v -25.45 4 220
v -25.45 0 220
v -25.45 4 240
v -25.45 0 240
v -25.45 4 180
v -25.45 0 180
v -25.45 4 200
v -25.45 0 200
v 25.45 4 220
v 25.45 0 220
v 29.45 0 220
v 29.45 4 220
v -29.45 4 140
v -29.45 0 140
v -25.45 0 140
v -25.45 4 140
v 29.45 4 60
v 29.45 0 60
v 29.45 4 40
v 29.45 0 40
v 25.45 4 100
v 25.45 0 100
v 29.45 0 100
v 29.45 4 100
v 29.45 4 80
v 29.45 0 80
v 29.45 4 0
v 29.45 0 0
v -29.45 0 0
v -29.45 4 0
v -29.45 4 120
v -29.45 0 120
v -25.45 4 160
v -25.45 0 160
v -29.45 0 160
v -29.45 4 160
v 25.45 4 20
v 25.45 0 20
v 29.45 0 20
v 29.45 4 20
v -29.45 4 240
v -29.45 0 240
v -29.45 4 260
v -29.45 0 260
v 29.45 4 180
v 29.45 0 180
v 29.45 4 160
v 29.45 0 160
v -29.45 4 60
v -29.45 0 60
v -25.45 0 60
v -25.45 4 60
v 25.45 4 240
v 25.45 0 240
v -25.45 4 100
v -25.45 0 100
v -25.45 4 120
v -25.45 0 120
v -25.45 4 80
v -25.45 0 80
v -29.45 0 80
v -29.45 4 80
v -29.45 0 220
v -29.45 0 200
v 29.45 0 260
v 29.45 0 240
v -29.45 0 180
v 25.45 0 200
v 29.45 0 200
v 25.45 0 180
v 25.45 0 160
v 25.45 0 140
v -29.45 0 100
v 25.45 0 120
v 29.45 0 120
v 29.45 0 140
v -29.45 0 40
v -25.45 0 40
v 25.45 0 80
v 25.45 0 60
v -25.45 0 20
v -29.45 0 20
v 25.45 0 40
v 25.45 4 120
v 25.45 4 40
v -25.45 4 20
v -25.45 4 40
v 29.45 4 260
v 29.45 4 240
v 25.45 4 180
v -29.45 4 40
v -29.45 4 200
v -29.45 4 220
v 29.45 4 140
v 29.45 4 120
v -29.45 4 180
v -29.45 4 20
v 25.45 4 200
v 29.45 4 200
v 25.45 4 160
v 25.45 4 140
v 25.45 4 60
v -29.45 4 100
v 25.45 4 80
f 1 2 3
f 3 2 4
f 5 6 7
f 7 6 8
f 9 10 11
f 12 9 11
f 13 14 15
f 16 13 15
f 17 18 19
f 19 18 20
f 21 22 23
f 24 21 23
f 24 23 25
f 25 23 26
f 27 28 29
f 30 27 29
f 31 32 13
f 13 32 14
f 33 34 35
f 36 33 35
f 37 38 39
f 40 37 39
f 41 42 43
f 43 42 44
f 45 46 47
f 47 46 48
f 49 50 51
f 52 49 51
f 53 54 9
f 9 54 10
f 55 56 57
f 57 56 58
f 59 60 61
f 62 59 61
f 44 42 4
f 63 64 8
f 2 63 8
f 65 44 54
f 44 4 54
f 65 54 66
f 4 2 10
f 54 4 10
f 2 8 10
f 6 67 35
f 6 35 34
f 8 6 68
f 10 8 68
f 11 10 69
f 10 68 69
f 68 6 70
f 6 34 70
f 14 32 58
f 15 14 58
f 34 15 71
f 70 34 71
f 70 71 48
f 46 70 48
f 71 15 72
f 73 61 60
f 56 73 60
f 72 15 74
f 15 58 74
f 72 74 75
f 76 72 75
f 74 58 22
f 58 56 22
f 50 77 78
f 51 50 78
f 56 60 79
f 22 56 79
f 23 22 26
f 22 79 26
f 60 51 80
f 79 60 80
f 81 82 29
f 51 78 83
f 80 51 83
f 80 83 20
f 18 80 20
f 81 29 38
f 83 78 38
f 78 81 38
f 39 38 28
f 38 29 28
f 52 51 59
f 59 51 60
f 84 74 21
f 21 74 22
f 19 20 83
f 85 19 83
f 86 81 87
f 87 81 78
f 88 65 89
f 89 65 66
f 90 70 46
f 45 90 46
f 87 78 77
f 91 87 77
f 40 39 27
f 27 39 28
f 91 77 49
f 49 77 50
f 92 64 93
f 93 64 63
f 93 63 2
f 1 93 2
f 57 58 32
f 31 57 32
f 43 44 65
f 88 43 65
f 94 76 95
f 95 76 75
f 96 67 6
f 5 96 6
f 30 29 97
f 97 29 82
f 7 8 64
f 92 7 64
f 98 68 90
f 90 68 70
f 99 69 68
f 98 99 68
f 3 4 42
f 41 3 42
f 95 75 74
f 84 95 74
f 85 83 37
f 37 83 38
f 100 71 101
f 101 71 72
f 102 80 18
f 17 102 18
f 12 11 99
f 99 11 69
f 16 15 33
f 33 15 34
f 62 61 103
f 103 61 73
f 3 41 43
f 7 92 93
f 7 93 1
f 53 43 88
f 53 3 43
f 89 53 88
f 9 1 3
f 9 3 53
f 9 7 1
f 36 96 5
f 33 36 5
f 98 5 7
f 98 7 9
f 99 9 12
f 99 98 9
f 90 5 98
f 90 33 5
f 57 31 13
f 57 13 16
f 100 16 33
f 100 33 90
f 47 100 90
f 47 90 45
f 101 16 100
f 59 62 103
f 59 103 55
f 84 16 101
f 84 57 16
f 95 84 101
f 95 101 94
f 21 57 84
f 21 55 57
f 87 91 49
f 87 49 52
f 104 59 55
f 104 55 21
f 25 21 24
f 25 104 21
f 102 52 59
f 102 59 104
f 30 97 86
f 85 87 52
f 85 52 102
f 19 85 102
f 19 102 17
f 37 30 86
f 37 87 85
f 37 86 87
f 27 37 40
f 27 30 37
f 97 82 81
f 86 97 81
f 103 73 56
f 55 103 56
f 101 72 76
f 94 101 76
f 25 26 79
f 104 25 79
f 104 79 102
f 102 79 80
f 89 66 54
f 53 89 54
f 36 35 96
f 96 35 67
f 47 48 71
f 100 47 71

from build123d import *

# Parameters (mm, degrees)
EXTRUDE_1_DEPTH = 4


with BuildPart() as part:
    # Эскиз1 → Бобышка-Вытянуть1 (new body)
    with BuildSketch(Plane(origin=(0, 0, 0), x_dir=(1, 0, 0), z_dir=(0, 1, 0))):
        Polygon((-29.45, -40), (-29.45, -60), (-25.45, -60), (-25.45, -80), (-29.45, -80), (-29.45, -100), (-25.45, -100), (-25.45, -120), (-29.45, -120), (-29.45, -140), (-25.45, -140), (-25.45, -160), (-29.45, -160), (-29.45, -180), (-25.45, -180), (-25.45, -200), (-29.45, -200), (-29.45, -220), (-25.45, -220), (-25.45, -240), (-29.45, -240), (-29.45, -260), (29.45, -260), (29.45, -240), (25.45, -240), (25.45, -220), (29.45, -220), (29.45, -200), (25.45, -200), (25.45, -180), (29.45, -180), (29.45, -160), (25.45, -160), (25.45, -140), (29.45, -140), (29.45, -120), (25.45, -120), (25.45, -100), (29.45, -100), (29.45, -80), (25.45, -80), (25.45, -60), (29.45, -60), (29.45, -40), (25.45, -40), (25.45, -20), (29.45, -20), (29.45, 0), (-29.45, 0), (-29.45, -20), (-25.45, -20), (-25.45, -40), align=None)
    extrude(amount=EXTRUDE_1_DEPTH)


solid = part.part
